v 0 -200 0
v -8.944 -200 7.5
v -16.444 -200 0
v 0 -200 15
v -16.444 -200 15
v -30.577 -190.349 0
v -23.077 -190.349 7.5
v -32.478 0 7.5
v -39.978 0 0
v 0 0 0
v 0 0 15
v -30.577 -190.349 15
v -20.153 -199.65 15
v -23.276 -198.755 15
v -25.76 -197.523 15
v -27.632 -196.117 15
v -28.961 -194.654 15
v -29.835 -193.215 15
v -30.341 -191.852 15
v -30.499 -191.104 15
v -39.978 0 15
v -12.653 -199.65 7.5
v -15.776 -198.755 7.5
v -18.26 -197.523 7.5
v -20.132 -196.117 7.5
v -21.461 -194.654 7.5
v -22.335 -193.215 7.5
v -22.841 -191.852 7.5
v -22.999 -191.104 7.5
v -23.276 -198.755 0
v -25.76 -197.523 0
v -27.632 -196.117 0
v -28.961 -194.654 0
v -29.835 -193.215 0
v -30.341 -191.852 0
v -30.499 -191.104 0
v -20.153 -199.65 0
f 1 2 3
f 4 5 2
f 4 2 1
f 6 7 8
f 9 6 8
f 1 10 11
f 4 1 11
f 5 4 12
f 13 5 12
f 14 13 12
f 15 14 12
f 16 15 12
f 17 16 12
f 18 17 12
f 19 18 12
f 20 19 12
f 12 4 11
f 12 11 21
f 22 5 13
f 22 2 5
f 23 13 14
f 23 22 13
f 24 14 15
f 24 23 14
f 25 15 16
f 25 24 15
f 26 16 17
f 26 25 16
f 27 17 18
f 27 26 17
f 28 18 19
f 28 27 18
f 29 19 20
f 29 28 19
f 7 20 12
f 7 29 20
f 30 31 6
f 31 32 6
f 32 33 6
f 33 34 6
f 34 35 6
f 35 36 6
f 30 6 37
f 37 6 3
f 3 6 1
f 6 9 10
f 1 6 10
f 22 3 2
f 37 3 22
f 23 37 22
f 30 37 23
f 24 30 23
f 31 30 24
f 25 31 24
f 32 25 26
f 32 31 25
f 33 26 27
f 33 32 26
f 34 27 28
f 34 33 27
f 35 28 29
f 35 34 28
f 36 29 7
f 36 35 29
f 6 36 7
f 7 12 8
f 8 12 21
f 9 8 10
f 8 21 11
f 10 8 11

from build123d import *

# Parameters (mm, degrees)
F1_DEPTH     = 200
F2_T1_DEPTH  = 531.7746698901
F2_T3_DEPTH  = 531.7746698901
F2_T9_DEPTH  = 1052.9427380625
F2_T14_DEPTH = 1052.9427380625
F3_R         = 10


# Not quite as in the source:
# - a fillet or chamfer that OpenCascade refuses, or shapes differently, is made with other operations: its cross-section is extruded or revolved along the edge and cut away or added


with BuildPart() as f1:
    # F0 (on Front) → F1 (new body)
    with BuildSketch(Plane.XZ):
        Polygon((-25, 0), (0, 0), (0, 15), (-40, 15), (-32.5, 7.5), (-40, 0), align=None)
    extrude(amount=F1_DEPTH)

    # F2: chamfer of 7 x 200.4537729804 on 2 edges, made by hand

    # F2_s2 → F2_t1 (cut)
    with BuildSketch(Plane(origin=(-396.0214751426, 0, 396.0214751426), x_dir=(0, 1, 0), z_dir=(0.7071067812, 0, -0.7071067812))):
        Polygon((-200, -10.6776695297), (0.4537729804, -17.6776695297), (-200, -17.6776695297), align=None)
    extrude(amount=F2_T1_DEPTH, mode=Mode.SUBTRACT)

    # F2_s4 → F2_t3 (cut)
    with BuildSketch(Plane(origin=(-12.5, 0, -12.5), x_dir=(0, 1, 0), z_dir=(-0.7071067812, 0, -0.7071067812))):
        Polygon((-200, -21.2842712475), (0.4537729804, -28.2842712475), (-200, -28.2842712475), align=None)
    extrude(amount=F2_T3_DEPTH, mode=Mode.SUBTRACT)


with BuildPart() as f2_tool7:
    # F2_s8 → F2_t9 (new body)
    with BuildSketch(Plane(origin=(-396.0214751426, 0, 396.0214751426), x_dir=(0, 1, 0), z_dir=(0.7071067812, 0, -0.7071067812))):
        Polygon((-200, -10.6776695297), (0.4537729804, -17.6776695297), (-200, -17.6776695297), align=None)
    extrude(amount=F2_T9_DEPTH)

    split(bisect_by=Plane.XY, keep=Keep.TOP)

    split(bisect_by=Plane(origin=(-20, 0, 20), x_dir=(0, 1, 0), z_dir=(0.7071067812, 0, -0.7071067812)), keep=Keep.TOP)


with BuildPart() as f2_tool12:
    # F2_s13 → F2_t14 (new body)
    with BuildSketch(Plane(origin=(356.0214751426, 0, 356.0214751426), x_dir=(0, 1, 0), z_dir=(-0.7071067812, 0, -0.7071067812))):
        Polygon((-200, -21.2842712475), (0.4537729804, -28.2842712475), (-200, -28.2842712475), align=None)
    extrude(amount=F2_T14_DEPTH)

    split(bisect_by=Plane(origin=(-12.5, 0, -12.5), x_dir=(0, 1, 0), z_dir=(0.7071067812, 0, 0.7071067812)), keep=Keep.TOP)

    split(bisect_by=Plane.XY.offset(15), keep=Keep.BOTTOM)


with BuildPart() as f2_tool7_1:
    add(f2_tool7.part)

    # F2_t17: intersect F2_tool12
    add(f2_tool12.part, mode=Mode.INTERSECT)


with BuildPart() as f1_1:
    add(f1.part)

    # F2_t5: cut F2_tool7
    add(f2_tool7_1.part, mode=Mode.SUBTRACT)

    # F3
    f3_edges = [f1_1.edges().sort_by_distance(p)[0] for p in [
        (-26.350505, -200, 11.25),
        (-26.350505, -200, 3.75),
    ]]
    fillet(f3_edges, radius=F3_R)


solid = f1_1.part
